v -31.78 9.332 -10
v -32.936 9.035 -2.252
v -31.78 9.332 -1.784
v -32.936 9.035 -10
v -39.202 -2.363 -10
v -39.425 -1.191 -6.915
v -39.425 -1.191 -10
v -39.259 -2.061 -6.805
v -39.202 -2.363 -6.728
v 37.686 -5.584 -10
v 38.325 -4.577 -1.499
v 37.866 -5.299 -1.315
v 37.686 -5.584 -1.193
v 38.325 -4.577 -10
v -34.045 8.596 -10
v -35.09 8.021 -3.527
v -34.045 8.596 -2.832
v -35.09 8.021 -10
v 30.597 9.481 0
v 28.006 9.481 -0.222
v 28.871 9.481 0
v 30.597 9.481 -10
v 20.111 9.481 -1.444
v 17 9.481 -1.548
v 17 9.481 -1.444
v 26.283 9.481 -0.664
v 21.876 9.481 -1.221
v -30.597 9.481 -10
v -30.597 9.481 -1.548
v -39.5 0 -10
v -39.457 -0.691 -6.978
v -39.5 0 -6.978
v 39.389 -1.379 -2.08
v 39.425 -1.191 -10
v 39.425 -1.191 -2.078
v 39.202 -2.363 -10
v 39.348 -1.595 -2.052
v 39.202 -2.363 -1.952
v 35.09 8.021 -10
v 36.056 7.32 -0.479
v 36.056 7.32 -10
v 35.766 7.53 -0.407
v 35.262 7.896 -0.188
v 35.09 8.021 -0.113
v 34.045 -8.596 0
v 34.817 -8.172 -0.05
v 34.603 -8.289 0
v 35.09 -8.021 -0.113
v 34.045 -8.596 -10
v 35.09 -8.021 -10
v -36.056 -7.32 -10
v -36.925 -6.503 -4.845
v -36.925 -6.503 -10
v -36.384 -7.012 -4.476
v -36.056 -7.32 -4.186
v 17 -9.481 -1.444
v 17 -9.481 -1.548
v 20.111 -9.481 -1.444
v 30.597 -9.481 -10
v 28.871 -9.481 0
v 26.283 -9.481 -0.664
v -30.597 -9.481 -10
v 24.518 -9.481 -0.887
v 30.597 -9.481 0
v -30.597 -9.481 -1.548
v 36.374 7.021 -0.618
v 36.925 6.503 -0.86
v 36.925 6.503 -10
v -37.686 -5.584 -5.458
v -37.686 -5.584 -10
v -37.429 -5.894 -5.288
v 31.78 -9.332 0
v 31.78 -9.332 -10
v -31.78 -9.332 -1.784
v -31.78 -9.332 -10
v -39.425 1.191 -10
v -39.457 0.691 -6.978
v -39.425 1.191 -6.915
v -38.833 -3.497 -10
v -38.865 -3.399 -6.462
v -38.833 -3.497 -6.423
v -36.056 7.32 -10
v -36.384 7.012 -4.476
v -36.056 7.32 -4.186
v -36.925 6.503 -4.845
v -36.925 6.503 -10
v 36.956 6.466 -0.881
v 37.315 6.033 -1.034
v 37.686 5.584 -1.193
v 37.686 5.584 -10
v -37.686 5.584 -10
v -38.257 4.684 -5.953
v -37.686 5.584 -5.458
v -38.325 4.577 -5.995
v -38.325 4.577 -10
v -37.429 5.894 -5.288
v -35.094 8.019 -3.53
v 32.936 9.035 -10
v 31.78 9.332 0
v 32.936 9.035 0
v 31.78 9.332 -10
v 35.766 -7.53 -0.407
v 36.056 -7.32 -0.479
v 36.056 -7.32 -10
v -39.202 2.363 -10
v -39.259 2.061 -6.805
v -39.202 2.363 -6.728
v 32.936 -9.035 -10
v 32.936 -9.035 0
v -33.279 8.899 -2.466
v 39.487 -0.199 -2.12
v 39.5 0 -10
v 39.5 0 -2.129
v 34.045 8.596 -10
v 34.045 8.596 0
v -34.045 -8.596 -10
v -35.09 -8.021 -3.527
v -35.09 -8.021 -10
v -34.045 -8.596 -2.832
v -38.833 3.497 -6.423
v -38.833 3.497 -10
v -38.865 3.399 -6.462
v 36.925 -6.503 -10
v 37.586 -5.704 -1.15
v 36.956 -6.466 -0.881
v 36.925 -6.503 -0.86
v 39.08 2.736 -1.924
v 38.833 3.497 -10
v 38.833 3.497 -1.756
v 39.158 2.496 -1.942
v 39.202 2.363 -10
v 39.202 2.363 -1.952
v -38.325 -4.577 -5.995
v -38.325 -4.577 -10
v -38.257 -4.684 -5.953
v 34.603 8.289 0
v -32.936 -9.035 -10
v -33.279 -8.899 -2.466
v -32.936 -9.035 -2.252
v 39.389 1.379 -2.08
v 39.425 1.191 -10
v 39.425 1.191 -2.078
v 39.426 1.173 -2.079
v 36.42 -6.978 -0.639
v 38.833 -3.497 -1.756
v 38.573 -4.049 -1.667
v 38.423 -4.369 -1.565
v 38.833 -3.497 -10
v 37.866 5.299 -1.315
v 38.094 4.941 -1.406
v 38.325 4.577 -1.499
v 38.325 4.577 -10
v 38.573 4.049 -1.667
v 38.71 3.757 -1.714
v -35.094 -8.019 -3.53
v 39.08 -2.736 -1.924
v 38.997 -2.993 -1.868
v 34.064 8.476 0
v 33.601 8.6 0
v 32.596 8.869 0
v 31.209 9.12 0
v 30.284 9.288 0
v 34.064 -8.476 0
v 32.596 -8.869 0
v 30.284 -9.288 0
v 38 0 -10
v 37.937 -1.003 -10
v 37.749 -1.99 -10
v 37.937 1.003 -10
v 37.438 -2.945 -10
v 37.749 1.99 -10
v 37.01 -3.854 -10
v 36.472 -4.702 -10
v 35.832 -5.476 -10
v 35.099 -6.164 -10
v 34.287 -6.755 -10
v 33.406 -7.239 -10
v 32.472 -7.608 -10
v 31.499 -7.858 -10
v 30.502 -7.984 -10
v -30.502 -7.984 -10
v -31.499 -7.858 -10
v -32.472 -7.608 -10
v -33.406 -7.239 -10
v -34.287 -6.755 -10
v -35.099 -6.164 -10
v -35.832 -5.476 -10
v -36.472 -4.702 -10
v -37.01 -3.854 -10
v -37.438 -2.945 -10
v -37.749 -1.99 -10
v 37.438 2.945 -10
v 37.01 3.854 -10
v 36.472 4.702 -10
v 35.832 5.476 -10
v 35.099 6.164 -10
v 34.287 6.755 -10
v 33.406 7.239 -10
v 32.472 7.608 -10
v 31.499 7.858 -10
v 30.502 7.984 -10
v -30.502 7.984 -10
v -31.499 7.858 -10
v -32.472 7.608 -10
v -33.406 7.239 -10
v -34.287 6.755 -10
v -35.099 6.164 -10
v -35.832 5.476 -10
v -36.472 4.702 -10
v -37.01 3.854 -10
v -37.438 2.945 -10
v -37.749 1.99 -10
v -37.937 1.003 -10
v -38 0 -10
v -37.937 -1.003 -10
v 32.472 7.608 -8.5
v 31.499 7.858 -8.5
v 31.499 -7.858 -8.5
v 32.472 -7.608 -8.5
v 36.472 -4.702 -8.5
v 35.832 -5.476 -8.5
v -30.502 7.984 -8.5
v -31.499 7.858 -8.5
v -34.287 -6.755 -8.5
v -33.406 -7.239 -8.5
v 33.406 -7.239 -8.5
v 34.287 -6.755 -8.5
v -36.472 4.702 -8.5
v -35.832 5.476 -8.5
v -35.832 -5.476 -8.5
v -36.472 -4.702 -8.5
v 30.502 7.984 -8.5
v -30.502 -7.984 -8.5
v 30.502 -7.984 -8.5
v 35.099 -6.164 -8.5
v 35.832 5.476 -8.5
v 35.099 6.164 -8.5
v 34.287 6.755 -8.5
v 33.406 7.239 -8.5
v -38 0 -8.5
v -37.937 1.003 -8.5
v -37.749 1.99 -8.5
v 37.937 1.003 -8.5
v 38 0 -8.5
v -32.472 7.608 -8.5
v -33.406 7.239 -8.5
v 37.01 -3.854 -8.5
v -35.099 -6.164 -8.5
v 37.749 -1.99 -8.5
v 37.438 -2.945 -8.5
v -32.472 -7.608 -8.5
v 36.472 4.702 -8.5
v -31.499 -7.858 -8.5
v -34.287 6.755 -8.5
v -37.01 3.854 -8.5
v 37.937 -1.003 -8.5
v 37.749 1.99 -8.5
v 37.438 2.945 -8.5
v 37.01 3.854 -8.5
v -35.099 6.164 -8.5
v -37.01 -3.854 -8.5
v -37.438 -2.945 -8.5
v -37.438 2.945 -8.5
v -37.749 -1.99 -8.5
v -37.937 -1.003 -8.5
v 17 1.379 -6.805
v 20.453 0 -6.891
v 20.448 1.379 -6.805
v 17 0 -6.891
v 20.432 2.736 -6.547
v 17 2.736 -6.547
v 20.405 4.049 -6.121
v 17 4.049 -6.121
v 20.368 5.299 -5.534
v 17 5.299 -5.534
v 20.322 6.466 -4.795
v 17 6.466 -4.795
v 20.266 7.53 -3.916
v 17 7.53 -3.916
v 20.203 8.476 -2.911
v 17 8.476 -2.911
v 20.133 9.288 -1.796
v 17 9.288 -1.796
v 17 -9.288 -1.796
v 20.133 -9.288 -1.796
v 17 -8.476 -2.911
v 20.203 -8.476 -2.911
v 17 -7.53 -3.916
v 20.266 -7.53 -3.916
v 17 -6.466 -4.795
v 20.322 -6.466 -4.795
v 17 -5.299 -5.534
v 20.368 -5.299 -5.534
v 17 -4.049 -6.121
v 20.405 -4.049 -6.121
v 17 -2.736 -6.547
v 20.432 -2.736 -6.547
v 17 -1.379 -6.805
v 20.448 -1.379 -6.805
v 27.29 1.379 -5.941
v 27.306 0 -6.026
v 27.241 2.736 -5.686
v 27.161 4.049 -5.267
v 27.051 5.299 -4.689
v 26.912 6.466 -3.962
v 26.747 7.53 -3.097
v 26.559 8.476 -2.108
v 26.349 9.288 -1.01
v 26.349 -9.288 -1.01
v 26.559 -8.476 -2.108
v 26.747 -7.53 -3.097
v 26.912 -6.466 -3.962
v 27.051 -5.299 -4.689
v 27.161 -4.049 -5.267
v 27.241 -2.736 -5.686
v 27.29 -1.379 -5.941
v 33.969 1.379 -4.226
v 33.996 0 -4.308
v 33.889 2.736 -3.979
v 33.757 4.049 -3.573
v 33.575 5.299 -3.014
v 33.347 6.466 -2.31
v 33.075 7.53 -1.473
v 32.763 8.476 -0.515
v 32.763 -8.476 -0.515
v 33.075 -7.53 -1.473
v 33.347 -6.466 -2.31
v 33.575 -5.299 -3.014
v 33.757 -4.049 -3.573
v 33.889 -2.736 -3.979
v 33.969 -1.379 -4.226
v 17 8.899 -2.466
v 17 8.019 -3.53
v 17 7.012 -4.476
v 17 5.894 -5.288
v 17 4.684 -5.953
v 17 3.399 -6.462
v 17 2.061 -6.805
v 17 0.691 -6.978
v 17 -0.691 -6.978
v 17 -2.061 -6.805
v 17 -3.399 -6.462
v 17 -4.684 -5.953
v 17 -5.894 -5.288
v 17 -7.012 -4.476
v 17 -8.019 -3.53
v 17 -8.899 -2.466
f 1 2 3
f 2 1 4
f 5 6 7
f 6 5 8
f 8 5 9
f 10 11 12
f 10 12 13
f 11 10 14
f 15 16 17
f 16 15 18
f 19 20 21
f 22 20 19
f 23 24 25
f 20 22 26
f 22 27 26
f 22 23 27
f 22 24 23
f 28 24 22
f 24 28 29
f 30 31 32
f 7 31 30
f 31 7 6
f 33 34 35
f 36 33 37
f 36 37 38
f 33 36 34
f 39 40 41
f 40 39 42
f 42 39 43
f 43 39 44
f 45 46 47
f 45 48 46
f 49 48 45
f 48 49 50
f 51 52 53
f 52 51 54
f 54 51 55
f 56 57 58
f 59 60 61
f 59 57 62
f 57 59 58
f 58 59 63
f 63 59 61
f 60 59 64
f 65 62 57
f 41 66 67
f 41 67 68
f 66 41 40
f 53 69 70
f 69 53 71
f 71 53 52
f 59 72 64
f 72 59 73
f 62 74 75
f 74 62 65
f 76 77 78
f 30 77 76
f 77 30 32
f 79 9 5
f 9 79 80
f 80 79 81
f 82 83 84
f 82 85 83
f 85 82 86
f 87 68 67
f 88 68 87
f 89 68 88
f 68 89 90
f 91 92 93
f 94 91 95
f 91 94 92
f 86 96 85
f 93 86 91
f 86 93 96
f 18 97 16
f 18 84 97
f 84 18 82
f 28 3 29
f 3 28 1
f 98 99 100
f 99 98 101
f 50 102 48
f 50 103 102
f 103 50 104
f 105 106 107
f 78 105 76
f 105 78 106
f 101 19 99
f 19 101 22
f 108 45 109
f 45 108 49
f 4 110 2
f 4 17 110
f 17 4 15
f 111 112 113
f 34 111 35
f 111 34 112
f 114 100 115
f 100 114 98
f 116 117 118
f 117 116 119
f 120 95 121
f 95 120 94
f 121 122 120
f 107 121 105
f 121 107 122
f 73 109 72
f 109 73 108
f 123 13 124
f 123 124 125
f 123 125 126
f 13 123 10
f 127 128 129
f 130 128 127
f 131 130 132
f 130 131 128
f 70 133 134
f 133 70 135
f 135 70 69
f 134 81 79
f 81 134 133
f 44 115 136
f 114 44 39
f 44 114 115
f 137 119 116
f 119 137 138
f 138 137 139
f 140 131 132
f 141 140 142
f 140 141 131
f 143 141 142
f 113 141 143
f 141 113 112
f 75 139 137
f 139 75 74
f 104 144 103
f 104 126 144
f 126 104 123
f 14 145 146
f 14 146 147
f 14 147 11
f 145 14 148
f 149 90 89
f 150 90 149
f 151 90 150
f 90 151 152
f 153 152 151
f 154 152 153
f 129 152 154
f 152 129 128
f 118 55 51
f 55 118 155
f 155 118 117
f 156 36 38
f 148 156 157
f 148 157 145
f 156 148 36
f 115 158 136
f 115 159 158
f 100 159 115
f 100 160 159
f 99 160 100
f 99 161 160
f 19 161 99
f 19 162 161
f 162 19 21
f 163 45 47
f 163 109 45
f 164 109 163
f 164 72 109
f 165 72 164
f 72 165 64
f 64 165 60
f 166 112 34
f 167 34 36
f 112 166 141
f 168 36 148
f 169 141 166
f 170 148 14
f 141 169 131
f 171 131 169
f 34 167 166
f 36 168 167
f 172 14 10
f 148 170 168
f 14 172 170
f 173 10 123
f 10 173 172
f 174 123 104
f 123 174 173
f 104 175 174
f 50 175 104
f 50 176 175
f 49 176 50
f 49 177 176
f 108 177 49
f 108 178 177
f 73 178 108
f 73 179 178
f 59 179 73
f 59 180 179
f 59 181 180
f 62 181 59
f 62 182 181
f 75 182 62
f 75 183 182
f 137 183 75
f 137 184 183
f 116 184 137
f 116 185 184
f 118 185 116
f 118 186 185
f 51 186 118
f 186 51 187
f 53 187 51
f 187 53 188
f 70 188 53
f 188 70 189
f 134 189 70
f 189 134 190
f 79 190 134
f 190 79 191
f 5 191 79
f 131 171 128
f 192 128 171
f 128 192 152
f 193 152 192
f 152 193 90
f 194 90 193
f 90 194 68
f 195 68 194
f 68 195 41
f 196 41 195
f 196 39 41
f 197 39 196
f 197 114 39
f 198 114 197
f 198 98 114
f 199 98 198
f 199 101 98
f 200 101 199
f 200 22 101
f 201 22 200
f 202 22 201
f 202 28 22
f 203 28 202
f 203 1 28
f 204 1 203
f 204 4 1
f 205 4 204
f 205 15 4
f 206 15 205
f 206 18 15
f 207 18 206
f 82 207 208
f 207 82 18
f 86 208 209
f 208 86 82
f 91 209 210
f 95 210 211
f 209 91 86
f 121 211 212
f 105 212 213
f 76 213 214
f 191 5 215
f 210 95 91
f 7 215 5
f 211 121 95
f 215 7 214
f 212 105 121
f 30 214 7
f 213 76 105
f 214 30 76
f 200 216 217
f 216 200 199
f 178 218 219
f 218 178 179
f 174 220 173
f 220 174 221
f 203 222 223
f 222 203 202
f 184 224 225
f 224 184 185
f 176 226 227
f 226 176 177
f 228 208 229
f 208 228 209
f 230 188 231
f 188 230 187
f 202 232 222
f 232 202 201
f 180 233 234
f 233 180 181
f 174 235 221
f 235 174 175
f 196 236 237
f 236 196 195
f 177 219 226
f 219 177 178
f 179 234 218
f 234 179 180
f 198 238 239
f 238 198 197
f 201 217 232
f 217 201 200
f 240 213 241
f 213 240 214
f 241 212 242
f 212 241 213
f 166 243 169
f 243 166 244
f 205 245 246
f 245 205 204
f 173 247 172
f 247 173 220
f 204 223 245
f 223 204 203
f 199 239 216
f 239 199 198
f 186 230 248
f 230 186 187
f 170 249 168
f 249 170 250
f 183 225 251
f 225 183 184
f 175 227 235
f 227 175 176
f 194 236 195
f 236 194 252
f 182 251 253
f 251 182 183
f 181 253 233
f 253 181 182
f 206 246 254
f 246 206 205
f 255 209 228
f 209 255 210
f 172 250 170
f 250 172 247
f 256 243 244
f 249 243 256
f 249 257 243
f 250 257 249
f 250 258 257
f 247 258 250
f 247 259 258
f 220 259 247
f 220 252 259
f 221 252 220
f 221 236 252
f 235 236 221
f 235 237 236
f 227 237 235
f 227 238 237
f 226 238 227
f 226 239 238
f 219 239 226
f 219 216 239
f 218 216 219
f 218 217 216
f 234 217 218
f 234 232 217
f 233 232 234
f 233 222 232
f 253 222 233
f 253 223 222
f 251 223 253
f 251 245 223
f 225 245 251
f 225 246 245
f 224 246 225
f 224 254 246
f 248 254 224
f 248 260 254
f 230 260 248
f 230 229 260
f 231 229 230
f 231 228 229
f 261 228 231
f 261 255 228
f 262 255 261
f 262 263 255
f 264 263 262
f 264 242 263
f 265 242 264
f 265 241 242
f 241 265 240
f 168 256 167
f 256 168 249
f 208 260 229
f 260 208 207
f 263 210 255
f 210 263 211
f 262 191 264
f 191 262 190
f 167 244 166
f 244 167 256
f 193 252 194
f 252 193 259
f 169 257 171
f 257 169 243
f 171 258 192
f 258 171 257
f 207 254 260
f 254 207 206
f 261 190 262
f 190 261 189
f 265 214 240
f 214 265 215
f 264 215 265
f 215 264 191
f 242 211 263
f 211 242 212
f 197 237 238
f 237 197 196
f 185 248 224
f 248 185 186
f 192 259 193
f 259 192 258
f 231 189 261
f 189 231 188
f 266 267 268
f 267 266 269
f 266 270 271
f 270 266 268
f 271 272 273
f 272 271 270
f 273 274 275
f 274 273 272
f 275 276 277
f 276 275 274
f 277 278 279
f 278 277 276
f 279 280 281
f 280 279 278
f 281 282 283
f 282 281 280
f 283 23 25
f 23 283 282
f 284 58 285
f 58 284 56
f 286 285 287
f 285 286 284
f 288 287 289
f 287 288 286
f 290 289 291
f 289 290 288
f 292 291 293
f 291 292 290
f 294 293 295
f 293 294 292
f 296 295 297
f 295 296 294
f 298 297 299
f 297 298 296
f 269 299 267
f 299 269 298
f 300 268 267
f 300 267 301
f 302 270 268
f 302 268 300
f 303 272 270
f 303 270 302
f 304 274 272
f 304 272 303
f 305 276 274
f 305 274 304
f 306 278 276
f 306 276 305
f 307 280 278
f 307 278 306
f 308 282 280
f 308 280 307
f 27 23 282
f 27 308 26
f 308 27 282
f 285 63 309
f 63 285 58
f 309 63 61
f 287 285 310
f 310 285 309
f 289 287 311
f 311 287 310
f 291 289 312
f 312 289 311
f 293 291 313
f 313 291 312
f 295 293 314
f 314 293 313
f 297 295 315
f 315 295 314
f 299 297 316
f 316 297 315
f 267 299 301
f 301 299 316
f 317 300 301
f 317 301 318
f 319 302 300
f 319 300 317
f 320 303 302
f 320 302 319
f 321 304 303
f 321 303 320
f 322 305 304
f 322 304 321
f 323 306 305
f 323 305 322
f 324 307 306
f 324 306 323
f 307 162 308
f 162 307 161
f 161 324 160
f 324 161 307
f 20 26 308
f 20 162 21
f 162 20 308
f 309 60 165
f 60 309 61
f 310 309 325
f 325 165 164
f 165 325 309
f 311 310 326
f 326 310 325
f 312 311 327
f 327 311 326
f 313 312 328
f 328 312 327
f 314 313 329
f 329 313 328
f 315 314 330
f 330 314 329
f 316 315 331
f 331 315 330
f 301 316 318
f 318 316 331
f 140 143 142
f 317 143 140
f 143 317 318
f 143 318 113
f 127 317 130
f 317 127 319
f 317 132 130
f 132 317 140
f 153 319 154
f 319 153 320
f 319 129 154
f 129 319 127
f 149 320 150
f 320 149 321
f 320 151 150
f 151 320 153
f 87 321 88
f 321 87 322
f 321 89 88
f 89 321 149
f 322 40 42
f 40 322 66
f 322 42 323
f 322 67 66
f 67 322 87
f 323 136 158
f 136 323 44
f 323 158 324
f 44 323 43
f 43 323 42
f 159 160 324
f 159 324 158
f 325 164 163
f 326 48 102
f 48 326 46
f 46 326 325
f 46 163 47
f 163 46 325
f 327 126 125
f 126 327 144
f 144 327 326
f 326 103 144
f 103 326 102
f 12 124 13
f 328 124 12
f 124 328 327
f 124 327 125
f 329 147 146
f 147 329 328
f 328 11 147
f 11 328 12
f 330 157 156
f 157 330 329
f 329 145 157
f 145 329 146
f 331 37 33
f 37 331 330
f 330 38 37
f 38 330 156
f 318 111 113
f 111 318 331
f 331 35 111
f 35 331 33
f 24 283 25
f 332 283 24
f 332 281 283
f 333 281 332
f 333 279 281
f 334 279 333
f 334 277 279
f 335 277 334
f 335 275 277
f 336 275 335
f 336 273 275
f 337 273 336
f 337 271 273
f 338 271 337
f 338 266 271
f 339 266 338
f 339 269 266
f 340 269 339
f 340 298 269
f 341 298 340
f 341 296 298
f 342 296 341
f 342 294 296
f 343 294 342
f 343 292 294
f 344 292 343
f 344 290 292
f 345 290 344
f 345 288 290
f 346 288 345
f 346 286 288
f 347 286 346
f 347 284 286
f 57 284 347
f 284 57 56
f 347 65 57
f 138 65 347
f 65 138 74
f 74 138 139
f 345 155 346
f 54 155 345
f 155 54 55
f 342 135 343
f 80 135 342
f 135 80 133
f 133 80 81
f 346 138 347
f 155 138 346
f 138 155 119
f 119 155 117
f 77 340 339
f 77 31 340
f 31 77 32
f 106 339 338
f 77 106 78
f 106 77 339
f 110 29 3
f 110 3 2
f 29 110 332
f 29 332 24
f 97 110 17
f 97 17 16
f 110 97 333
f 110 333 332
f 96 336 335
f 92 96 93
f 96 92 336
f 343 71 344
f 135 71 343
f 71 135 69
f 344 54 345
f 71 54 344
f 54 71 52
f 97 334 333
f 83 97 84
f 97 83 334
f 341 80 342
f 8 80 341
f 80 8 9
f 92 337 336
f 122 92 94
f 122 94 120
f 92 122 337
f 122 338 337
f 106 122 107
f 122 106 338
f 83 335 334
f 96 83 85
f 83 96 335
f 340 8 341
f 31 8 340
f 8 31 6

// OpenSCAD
$fn = 50;

module bar() {
	translate([-44-11,-44-11,0])
	union(){
		
		difference(){
			rotate_extrude(convexity = 120) translate ([44,0,0]) circle(11);
			translate([-70,0,-11]) cube([70,70,45]);
			translate([-70,-70,-11]) cube([140,70,45]);
		}
	
		translate([44,0,0]) rotate([90,0,0]) cylinder(r=11,h=80);	
		translate([0,44,0]) rotate([0,270,0]) cylinder(r=11,h=80);
	}
}


module slider() {
	translate([-30,0,0])
	difference() {
		hull() {
			cylinder(r=9.5, h=10);
			translate([60,0,0]) cylinder(r=9.5, h=10);
		}
		
		translate([0,0,8.5])
		hull() {
			cylinder(r=8, h=10);
			translate([60,0,0]) cylinder(r=8, h=10);
		}
	}
}


/*
rotate([180,0,0])
difference() {
	slider();
	translate([0, 40, -11+10-3])
	rotate([0,0,45]) #bar();
}
*/



rotate([180,0,0])
difference() {
	slider();
	translate([55+17, 0, 10-3]) 
	rotate([90,0,0]) #bar();
}
